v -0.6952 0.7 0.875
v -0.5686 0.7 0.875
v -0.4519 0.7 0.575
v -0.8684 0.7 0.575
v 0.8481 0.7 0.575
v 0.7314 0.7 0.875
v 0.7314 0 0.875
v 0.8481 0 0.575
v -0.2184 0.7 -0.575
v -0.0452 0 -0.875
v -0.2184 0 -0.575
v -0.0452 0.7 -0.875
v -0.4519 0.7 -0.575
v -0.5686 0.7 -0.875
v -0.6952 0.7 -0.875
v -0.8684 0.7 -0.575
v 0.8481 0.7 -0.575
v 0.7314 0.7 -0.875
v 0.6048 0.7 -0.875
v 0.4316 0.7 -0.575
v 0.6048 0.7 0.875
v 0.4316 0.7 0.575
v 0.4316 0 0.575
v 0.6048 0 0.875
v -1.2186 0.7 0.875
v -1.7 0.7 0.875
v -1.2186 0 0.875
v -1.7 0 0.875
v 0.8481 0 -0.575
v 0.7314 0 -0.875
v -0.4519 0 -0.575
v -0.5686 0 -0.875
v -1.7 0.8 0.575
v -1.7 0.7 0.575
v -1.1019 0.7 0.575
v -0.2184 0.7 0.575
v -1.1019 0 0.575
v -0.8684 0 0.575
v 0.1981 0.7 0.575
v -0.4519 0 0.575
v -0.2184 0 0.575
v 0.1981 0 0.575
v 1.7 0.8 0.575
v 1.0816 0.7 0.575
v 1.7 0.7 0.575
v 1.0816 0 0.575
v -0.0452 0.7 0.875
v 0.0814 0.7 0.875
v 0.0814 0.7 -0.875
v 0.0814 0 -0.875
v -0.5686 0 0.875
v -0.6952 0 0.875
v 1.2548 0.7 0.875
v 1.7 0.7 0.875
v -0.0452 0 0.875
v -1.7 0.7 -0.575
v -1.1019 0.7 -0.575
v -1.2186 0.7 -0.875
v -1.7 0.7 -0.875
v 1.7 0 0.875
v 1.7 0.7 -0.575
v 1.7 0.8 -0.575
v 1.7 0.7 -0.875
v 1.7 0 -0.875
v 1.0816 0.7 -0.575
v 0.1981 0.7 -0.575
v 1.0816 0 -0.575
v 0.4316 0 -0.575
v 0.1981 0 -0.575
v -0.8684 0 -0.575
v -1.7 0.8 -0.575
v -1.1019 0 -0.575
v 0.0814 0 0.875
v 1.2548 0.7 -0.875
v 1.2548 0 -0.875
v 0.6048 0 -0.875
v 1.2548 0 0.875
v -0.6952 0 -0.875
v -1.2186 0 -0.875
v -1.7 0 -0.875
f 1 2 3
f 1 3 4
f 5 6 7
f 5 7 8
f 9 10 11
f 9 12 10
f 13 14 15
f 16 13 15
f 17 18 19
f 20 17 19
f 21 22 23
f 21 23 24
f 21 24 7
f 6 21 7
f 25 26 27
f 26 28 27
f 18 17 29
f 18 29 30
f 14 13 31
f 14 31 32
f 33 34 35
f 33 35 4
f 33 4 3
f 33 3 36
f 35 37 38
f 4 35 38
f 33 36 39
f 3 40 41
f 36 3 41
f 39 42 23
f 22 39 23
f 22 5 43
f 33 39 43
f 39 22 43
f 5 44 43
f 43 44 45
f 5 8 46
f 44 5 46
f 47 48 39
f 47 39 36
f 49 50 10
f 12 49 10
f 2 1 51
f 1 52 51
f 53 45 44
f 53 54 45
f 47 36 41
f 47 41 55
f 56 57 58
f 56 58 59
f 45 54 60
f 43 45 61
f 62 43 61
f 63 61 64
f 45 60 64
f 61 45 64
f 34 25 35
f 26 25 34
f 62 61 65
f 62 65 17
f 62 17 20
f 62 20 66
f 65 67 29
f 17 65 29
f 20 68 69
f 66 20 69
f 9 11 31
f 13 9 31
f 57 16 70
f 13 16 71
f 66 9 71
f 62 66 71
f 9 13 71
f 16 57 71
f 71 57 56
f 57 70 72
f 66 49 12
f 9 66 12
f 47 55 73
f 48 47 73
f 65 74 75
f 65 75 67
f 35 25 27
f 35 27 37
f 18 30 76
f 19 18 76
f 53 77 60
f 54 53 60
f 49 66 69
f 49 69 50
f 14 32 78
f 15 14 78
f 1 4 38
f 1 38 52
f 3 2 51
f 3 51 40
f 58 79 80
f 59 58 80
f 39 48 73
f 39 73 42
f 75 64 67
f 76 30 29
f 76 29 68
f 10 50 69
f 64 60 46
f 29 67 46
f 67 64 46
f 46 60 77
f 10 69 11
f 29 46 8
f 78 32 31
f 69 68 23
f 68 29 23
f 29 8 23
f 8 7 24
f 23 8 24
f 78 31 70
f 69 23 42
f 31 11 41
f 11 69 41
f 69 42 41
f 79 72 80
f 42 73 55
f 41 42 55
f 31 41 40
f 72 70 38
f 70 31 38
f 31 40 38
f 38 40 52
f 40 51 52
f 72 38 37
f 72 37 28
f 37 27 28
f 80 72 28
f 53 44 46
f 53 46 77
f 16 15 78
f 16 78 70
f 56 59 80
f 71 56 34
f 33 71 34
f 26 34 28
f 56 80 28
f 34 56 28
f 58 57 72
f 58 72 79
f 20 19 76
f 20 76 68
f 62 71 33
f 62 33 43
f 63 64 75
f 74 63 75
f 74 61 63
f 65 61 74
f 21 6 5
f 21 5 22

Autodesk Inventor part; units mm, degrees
ref_plane "YZ Plane" through (0, 0, 0) normal (1, 0, 0) x (0, 1, 0)
ref_plane "XZ Plane" through (0, 0, 0) normal (0, 1, 0) x (-1, 0, 0)
ref_plane "XY Plane" through (0, 0, 0) normal (0, 0, 1) x (1, 0, 0)
sketch "Sketch1" plane through (0, 0, 0) normal (0, 1, 0) x (-1, 0, 0)
  line L0 (1.7, 0.875) -> (-1.7, 0.875)
  line L1 (-1.7, 0.875) -> (-1.7, -0.875)
  line L2 (-1.7, -0.875) -> (1.7, -0.875)
  line L3 (1.7, -0.875) -> (1.7, 0.875)
  point P0 (0, 0)
  dimension "d0" = 1.75
  dimension "d1" = 0.875
  dimension "d2" = 1.7
  dimension "d3" = 3.4
extrude "Extrusion1" add sketch "Sketch1" along normal blind 0.7
sketch "Sketch3" plane through (0, 0.7, 0) normal (0, 1, 0) x (1, 0, 0)
  line L0 (1.7, -0.875) -> (1.7, -0.575)
  line L1 (1.7, -0.875) -> (1.7, 0.875) projected
  line L2 (-1.7, -0.875) -> (1.7, -0.875) projected
  line L3 (0.6665, -0.875) -> (0.6665, -0.575)
  line L4 (1.4815, -0.875) -> (1.4815, -0.745)
  line L5 (1.0816, -0.575) -> (0.8481, -0.575)
  line L6 (1.2548, -0.875) -> (0.7314, -0.875)
  line L7 (0.7314, -0.875) -> (0.8481, -0.575)
  line L8 (1.0816, -0.575) -> (1.2548, -0.875)
  point P0 (0, 0)
  dimension "d9" = 0
  dimension "d24" = 0.2185
  dimension "d25" = 120
  dimension "d26" = 111.251
  dimension "d27" = 0.2335
  dimension "d29" = 68.749
extrude "Extrusion2" cut sketch "Sketch3" against normal blind 0.7
pattern_linear "Rectangular Pattern1" count 4 spacing 0.65 along (-1, 0, 0) of "Extrusion2"
mirror "Mirror1" about plane through (0, 0, 0) normal (0, 0, 1) of "Extrusion2", "Rectangular Pattern1"
sketch "Sketch4" plane through (0, 0.7, 0) normal (0, 1, 0) x (1, 0, 0)
  line L0 (1.7, -0.875) -> (1.7, 0.875) projected
  line L1 (-1.7, 0.875) -> (-1.7, -0.875) projected
  line L2 (1.7, 0.575) -> (-1.7, 0.575)
  line L3 (-1.7, 0.575) -> (-1.7, -0.575)
  line L4 (-1.7, -0.575) -> (1.7, -0.575)
  line L5 (1.7, -0.575) -> (1.7, 0.575)
  point P0 (0, 0)
extrude "Extrusion3" add sketch "Sketch4" along normal blind 0.1
properties part number "746SeriesR"
